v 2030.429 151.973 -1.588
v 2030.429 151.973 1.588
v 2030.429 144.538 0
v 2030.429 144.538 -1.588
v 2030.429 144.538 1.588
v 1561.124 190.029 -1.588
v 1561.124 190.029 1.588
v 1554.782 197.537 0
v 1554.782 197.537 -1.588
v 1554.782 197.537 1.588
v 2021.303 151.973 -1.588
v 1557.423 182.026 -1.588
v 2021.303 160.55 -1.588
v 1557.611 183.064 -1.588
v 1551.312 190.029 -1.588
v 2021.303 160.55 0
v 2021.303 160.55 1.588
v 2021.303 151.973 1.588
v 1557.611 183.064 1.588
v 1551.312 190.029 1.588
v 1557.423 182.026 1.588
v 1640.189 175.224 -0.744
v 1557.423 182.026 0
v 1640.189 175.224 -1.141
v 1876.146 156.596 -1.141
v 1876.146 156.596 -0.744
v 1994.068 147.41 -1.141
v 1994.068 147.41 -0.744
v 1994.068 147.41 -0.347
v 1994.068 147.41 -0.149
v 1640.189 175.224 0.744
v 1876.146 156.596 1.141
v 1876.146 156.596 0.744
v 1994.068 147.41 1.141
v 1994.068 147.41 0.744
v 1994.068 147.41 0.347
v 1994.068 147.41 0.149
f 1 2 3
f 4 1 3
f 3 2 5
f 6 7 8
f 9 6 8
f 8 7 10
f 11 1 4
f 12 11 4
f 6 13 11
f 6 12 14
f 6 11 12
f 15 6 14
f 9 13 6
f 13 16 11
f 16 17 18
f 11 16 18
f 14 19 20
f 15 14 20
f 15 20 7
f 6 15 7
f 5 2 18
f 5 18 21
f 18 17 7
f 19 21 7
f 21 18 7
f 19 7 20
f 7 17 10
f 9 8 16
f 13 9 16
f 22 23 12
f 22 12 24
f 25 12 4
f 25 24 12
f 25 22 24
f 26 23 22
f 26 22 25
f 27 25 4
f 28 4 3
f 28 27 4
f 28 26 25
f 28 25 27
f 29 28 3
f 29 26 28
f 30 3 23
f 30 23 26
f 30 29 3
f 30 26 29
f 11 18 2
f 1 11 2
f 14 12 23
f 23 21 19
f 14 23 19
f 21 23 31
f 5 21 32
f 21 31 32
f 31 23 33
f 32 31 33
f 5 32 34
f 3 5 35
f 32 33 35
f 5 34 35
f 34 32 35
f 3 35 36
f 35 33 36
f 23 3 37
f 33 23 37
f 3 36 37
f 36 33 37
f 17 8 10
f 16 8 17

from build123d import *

# Parameters (mm, degrees)
BOSS_EXTRUDE1_DEPTH = 1.5875
FILLET1_R           = 2.54
CUT_EXTRUDE1_DEPTH  = 7.62


with BuildPart() as part:
    # Sketch2 → Boss-Extrude1 (new body, symmetric)
    with BuildSketch(Plane.XY):
        with BuildLine():
            add(Edge.make_bspline(
                [(825.5, 263.72872798), (833.004293944, 262.763036085), (840.535916247, 261.846014478), (848.126574562, 260.964164828), (892.90639318, 255.945629274), (937.686211733, 251.779150949), (973.452075064, 248.227669425), (1071.946672141, 239.051054038), (1170.441269319, 229.731506738), (1231.791940344, 224.503945813), (1324.899336146, 216.790627817), (1418.006730935, 209.040117978), (1449.742935921, 206.361809936), (1636.928606778, 190.521130342), (1824.114277635, 175.409157235), (1979.966947376, 164.299650253), (2156.268639429, 150.414433314), (2332.570330468, 133.857216402), (2354.212983157, 131.78508222), (2394.341467798, 127.847039259), (2434.469952439, 123.717187755), (2453.57670361, 121.704562273), (2472.669581058, 119.647220503), (2491.74, 117.547195763)],
                knots=[78.681340958, 78.681340958, 78.681340958, 78.681340958, 78.681340958, 78.681340958, 82.46579272, 82.46579272, 82.46579272, 100.7932901, 100.7932901, 100.7932901, 131.0989539, 131.0989539, 131.0989539, 146.7691983, 146.7691983, 146.7691983, 223.5339586, 223.5339586, 223.5339586, 233.9431167, 233.9431167, 233.9431167, 243.40815085, 243.40815085, 243.40815085, 243.40815085, 243.40815085, 243.40815085], degree=5))
            Line((825.5, 263.72872798), (825.5, 248.364439806))
            add(Edge.make_bspline(
                [(825.5, 248.364439806), (827.20768691, 248.14708351), (833.784664511, 247.321927102), (845.28106727, 245.953419483), (860.086531547, 244.295598067), (879.830703434, 242.186646028), (904.369967092, 239.698279806), (933.571022669, 236.832150625), (962.642718041, 234.023667741), (991.762593943, 231.241975908), (1021.072010315, 228.475862291), (1060.376437315, 224.796956681), (1109.513015577, 220.184378862), (1168.511190361, 214.817071985), (1227.500129793, 209.662054042), (1306.133167947, 203.021178328), (1404.361477105, 194.920725932), (1522.239851071, 184.918066624), (1640.182856491, 175.167007786), (1758.165352567, 165.757639485), (1876.155384769, 156.590937079), (1994.08749188, 147.453250142), (2092.268692061, 139.624216053), (2170.748029042, 133.079656729), (2219.771730977, 128.842227836), (2258.983988247, 125.347211495), (2288.379457536, 122.670854497), (2317.812243116, 119.931729386), (2347.551509172, 117.100365283), (2377.159899727, 114.21011853), (2406.469653851, 111.26896801), (2435.81832606, 108.240091266), (2464.242715806, 105.222889554), (2482.876892709, 103.192325927), (2491.74, 102.214848055)],
                knots=[78.875303138, 78.875303138, 78.875303138, 78.875303138, 79.386176103, 80.841530691, 82.29688528, 83.752239868, 86.662949044, 89.57365822, 92.484367397, 95.395076573, 98.305785749, 101.216494926, 107.037913278, 112.859331631, 118.680749984, 124.502168336, 136.145005042, 147.787841747, 159.430678452, 171.073515158, 182.716351863, 194.359188568, 206.002025273, 211.823443626, 217.644861979, 220.555571155, 223.466280331, 226.376989508, 229.287698684, 232.19840786, 235.109117037, 238.019826213, 240.930535389, 243.57402126, 243.57402126, 243.57402126, 243.57402126], degree=3))
            Line((2491.74, 102.214848055), (2491.74, 117.547195763))
        make_face()
    extrude(amount=BOSS_EXTRUDE1_DEPTH, both=True)

    # Fillet1
    fillet1_edges = [part.edges().sort_by_distance(p)[0] for p in [
        (2491.74, 102.214848055, -0.79375),
        (2491.74, 117.547195763, -0.79375),
        (825.5, 248.364439806, -0.79375),
        (825.5, 263.72872798, 0.79375),
    ]]
    fillet(fillet1_edges, radius=FILLET1_R)

    # Sketch3 → Cut-Extrude1 (cut)
    with BuildSketch(Plane.XY.offset(1.5875)):
        Polygon((1554.781712943, 197.53701635), (1554.781712943, 212.261982037), (810.451845726, 281.004031423), (810.451845726, 218.449722533), (1556.643823708, 177.737068235), (1557.611128436, 183.063577113), (1551.311808982, 190.02917074), (1561.124210439, 190.02917074), align=None)
        Polygon((2021.302635877, 160.549539386), (2021.302635877, 151.973195802), (2030.428965883, 151.973195802), (2030.428965883, 144.537877355), (2030.428965883, 141.701918937), (2503.989680451, 84.628223704), (2503.989680451, 125.393497308), (2021.302635877, 169.971712045), align=None)
    extrude(amount=-CUT_EXTRUDE1_DEPTH, mode=Mode.SUBTRACT)


solid = part.part
